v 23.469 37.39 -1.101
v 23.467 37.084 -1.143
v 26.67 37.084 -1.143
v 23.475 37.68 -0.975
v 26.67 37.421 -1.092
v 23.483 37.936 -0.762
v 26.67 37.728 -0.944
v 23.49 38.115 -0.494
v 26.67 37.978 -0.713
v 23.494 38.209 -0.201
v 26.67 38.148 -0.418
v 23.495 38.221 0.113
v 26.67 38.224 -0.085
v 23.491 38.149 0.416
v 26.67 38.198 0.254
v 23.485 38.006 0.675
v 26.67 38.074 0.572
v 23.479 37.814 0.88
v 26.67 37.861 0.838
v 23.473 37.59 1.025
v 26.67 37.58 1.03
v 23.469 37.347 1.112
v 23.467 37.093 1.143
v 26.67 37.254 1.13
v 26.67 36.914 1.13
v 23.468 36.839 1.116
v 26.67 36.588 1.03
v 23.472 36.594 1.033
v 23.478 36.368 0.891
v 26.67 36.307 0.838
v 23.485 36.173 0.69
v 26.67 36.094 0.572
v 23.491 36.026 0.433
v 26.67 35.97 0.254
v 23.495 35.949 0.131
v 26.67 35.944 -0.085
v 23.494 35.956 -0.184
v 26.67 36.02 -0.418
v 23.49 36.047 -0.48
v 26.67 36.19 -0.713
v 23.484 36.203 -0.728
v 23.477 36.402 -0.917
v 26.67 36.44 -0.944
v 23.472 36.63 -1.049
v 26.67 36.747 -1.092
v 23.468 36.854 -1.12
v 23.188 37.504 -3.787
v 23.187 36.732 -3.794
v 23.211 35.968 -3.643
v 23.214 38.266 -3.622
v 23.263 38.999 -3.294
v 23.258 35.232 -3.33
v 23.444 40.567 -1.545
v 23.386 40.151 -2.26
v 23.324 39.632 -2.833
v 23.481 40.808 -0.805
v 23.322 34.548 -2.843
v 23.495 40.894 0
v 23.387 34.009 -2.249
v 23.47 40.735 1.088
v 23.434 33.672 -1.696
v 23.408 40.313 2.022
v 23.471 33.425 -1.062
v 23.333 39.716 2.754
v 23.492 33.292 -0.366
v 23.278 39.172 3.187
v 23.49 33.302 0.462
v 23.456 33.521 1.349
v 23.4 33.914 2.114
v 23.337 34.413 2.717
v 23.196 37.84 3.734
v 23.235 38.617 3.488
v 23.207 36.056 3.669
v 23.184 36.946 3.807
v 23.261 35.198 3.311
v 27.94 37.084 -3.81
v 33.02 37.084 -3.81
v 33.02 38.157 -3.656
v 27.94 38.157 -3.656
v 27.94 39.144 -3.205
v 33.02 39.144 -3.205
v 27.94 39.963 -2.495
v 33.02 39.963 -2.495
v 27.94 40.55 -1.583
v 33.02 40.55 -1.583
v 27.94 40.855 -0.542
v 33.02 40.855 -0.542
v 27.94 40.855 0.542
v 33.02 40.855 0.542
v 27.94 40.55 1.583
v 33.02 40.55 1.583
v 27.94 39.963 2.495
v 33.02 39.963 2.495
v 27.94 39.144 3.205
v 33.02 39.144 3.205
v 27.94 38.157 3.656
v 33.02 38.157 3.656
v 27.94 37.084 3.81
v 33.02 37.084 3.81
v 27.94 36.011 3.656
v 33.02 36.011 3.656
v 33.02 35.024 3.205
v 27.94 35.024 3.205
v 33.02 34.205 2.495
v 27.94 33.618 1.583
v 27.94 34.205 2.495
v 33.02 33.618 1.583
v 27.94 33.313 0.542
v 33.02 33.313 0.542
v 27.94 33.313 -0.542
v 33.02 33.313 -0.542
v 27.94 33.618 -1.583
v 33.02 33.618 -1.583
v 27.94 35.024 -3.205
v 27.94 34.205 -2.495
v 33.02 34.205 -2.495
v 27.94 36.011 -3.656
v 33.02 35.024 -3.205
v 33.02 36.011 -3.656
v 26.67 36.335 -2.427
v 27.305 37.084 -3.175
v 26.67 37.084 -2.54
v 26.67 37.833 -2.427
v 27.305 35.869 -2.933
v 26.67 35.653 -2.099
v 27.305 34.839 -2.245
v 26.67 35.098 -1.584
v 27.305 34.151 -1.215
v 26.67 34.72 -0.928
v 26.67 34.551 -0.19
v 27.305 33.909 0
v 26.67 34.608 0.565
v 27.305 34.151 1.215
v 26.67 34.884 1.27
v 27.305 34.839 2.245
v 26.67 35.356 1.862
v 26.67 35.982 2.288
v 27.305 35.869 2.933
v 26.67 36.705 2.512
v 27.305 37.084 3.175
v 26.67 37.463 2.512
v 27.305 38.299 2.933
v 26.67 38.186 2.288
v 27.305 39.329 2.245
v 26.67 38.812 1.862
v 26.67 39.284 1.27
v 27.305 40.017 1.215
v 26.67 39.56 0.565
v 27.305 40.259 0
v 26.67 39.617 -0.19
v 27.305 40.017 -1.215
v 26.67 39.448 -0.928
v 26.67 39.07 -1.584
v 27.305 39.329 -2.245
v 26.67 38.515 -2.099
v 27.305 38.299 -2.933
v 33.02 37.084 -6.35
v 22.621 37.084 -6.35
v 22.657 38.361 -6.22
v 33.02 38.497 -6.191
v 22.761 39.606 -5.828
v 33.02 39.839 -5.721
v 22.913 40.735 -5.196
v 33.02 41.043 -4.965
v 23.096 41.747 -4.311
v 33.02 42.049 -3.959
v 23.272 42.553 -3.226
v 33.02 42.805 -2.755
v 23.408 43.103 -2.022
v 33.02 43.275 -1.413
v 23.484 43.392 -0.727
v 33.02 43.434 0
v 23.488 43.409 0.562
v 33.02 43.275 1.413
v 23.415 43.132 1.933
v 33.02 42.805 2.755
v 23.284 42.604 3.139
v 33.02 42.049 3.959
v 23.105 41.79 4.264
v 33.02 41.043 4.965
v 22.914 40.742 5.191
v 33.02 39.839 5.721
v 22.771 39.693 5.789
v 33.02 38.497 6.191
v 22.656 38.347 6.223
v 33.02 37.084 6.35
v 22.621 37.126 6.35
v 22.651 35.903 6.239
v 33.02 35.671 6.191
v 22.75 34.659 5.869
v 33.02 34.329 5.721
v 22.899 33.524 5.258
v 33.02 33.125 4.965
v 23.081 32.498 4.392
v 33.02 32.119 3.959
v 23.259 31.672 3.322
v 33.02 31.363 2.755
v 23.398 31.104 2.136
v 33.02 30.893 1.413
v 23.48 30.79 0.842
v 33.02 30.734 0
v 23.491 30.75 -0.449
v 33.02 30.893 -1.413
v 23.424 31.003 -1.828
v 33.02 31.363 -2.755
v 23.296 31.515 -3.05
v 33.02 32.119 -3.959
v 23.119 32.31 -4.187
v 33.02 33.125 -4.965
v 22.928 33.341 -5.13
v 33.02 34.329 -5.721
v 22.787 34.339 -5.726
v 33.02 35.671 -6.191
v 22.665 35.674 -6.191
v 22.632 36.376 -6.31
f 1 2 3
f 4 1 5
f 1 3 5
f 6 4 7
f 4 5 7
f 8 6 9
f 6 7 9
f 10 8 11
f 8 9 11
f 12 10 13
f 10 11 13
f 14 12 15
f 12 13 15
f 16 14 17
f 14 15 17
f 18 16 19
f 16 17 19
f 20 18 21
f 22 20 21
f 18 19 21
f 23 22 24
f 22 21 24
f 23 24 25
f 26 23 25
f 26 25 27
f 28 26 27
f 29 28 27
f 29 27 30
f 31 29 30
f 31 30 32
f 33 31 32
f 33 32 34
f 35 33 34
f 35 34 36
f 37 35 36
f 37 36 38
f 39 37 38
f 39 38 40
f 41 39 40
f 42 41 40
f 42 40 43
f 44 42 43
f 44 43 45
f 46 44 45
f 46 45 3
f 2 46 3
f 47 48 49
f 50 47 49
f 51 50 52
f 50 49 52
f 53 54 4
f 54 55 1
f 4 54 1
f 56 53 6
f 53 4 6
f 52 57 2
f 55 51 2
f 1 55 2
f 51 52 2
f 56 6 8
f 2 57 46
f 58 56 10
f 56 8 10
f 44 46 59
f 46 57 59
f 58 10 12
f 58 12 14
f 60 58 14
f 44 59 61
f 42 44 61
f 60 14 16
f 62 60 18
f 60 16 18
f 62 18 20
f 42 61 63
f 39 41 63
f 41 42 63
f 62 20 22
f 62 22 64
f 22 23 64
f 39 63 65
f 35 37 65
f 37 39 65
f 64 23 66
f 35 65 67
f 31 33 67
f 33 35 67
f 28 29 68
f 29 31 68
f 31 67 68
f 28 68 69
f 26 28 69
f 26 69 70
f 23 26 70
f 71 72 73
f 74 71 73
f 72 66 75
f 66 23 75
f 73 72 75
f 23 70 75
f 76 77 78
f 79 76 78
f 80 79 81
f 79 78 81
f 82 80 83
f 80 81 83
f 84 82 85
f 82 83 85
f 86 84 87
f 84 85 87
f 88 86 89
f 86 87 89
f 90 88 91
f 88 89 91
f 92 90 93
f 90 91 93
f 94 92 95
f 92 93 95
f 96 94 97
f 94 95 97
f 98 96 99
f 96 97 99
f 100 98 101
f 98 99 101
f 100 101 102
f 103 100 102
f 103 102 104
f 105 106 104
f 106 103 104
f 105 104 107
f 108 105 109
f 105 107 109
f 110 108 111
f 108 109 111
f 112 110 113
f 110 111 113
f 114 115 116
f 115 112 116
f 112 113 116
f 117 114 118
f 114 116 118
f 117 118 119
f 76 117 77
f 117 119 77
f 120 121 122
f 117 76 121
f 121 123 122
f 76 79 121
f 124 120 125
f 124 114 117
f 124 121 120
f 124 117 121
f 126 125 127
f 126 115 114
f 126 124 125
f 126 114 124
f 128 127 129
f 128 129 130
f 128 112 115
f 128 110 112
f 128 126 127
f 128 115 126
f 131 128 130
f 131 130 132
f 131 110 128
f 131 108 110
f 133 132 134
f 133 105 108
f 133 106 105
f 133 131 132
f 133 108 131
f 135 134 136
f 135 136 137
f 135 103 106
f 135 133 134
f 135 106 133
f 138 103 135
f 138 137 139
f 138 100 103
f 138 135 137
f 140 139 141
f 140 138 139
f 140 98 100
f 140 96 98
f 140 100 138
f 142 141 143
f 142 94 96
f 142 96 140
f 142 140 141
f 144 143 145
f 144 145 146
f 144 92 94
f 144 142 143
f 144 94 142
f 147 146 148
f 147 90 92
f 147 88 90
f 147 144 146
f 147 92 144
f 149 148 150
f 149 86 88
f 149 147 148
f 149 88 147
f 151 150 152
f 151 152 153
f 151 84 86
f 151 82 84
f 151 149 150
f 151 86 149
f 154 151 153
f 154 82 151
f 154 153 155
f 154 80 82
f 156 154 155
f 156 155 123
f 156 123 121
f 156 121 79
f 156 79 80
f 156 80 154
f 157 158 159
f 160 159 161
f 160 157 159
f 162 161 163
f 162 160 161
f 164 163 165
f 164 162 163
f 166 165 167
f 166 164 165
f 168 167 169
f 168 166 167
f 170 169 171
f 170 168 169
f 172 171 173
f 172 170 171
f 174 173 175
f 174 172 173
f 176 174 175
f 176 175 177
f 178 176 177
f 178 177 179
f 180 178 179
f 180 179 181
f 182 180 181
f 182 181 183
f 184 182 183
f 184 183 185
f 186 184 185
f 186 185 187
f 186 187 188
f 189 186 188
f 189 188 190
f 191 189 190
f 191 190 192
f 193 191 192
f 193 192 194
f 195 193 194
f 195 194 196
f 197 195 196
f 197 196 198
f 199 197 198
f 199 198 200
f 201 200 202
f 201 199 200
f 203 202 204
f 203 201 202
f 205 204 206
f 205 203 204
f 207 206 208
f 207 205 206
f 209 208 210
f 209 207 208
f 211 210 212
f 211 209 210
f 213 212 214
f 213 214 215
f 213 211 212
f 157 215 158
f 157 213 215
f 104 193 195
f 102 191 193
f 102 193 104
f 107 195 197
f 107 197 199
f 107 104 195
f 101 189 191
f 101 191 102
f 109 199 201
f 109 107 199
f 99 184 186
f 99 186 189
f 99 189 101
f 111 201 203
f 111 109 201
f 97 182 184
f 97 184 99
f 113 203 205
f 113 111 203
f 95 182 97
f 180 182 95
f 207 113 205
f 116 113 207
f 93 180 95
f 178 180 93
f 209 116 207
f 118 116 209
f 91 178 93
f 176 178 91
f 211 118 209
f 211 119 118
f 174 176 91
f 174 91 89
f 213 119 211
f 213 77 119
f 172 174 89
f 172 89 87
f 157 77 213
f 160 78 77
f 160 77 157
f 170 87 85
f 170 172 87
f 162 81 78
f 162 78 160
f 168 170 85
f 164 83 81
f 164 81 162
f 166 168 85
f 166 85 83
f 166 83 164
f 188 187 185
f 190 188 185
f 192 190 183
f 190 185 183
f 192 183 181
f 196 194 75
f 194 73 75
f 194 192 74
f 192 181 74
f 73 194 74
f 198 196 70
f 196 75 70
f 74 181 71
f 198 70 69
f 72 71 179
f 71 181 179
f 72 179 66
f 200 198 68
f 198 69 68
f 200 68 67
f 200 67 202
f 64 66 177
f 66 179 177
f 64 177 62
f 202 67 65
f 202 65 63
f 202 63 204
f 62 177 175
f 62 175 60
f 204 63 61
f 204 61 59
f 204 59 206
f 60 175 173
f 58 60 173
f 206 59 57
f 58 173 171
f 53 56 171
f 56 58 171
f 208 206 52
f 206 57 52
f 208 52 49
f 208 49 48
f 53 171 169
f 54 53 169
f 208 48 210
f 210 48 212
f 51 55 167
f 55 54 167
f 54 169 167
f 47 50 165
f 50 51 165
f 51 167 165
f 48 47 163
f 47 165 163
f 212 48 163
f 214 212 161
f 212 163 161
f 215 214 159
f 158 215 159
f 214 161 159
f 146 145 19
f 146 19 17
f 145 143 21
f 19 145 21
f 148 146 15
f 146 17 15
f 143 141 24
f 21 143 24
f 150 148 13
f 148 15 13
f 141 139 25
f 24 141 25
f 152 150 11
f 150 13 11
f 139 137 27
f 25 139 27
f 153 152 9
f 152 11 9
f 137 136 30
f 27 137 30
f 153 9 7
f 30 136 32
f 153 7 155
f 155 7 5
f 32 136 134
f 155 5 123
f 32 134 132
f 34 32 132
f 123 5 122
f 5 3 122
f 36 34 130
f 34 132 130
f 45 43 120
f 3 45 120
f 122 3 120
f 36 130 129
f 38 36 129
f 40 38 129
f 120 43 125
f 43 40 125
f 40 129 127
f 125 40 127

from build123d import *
from build123d.topology import SkipClean

# Parameters (mm, degrees)
SKETCH2_R                            = 23.495
INITIAL_DISK_DEPTH                   = 7.62
HOLLOW_START                         = 54.61
HOLLOW_CYLINDER_DEPTH                = 54.61
SKETCH5_R                            = 1.524
Y_SERVO_HOLE_1_DEPTH                 = 9.398
SKETCH8_R                            = 3.175
Y_SERVO_HOLE_3_DEPTH                 = 5.715
BOSS_EXTRUDE2_REACH                  = 65.924
BOSS_EXTRUDE2_DIRECTION_2_REACH      = 65.924
CUT_EXTRUDE3_DEPTH                   = 64.924034212
SKETCH9_W                            = 2.54
SKETCH9_H                            = 30.48
X_SERVO_TOP_MOUNT_DEPTH              = 6.35
FILLET3_START                        = -22
FILLET3_DEPTH                        = 45.495
SKETCH11_R                           = 2.286
X_SERVO_TOP_HOLES_DEPTH              = 2.54
X_START                              = 6.858
X_SERVO_BOTTOM_MOUNT_DEPTH           = 6.858
SKETCH14_R                           = 2.3495
X_SERVO_BOTTOM_HOLES_DEPTH           = 6.35
SKETCH15_R                           = 4.445
X_SERVO_BOTTOM_SCREW_CLEARANCE_DEPTH = 16.51
SKETCH18_W                           = 5.08
SKETCH18_H                           = 22.86
CUT_EXTRUDE2_DEPTH                   = 2.54
FILLET1_R                            = 1.27
BOSS_EXTRUDE1_DEPTH                  = 1.905
BOSS_EXTRUDE3_REACH                  = 70.14
SKETCH23_W                           = 1.905
SKETCH23_H                           = 0.757768233
BOSS_EXTRUDE4_DEPTH                  = 2.54
SKETCH24_R                           = 0.6096
CUT_EXTRUDE4_DEPTH                   = 10.16
BOSS_EXTRUDE5_REACH                  = 84.026
BOSS_EXTRUDE5_END_RADIUS             = 23.495
SKETCH16_R                           = 6.35
SKETCH16_R_2                         = 3.81
SKETCH26_R                           = 23.495
CUT_EXTRUDE5_DEPTH                   = 76.2
BOSS_EXTRUDE6_START                  = 33.2739999
BOSS_EXTRUDE6_DEPTH                  = 7.6200001
SKETCH29_R                           = 1.143
CUT_EXTRUDE6_DEPTH                   = 5.08
CHAMFER1_SIZE                        = 1.27


with BuildPart() as part:
    # Sketch2 → Initial Disk (new body)
    with BuildSketch(Plane(origin=(0, 0, 0), x_dir=(1, 0, 0), z_dir=(0, 1, 0))):
        with Locations(Location((0, 0, 0), (0, 0, 270))):
            Circle(SKETCH2_R)
    extrude(amount=-INITIAL_DISK_DEPTH)

    # Sketch3 → Hollow Cylinder (add)
    with SkipClean():  # the faces are left unmerged after this step: merging them gives an invalid solid
        with BuildSketch(Plane(origin=(0, 0, 0), x_dir=(1, 0, 0), z_dir=(0, 1, 0)).offset(HOLLOW_START)):
            with BuildLine():
                Line((-17.770847855, 11.104458182), (-20.705217543, 11.104458182))
                ThreePointArc((-20.705217543, 11.104458182), (23.495, 0), (-20.705217543, -11.104458182))
                Line((-20.705217543, -11.104458182), (-17.770847855, -11.104458182))
                ThreePointArc((-17.770847855, -11.104458182), (20.955, 0), (-17.770847855, 11.104458182))
            make_face()
        extrude(amount=-HOLLOW_CYLINDER_DEPTH)

    # Sketch5 → Y Servo Hole 1 (cut)
    with SkipClean():  # the faces are left unmerged after this step: merging them gives an invalid solid
        with BuildSketch(Plane.XZ.offset(7.62)):
            with Locations(Location((0, 0, 0), (0, 0, 270))):
                Circle(SKETCH5_R)
        extrude(amount=-Y_SERVO_HOLE_1_DEPTH, mode=Mode.SUBTRACT)

    # Sketch8 → Y Servo Hole 3 (cut)
    with SkipClean():  # the faces are left unmerged after this step: merging them gives an invalid solid
        with BuildSketch(Plane(origin=(0, 0, 0), x_dir=(1, 0, 0), z_dir=(0, 1, 0))):
            with Locations(Location((0, 0, 0), (0, 0, 270))):
                Circle(SKETCH8_R)
        extrude(amount=-Y_SERVO_HOLE_3_DEPTH, mode=Mode.SUBTRACT)

    # Sketch20 → Boss-Extrude2 (add, up to next)
    with BuildSketch(Plane(origin=(0, 0, 0), x_dir=(0, 0, -1), z_dir=(1, 0, 0)), mode=Mode.PRIVATE) as boss_extrude2_sk1:
        Polygon((23.495, 41.342827261), (14.205225637, 54.61), (11.104458182, 54.61), (21.414353808, 39.885943113), align=None)
    boss_extrude2_tool1 = extrude(boss_extrude2_sk1.sketch, amount=BOSS_EXTRUDE2_REACH, mode=Mode.PRIVATE) - part.part
    boss_extrude2 = boss_extrude2_tool1.solids().sort_by_distance((0, 47.605874, -17.532286))[0]
    add(boss_extrude2)

    # Sketch20 → Boss-Extrude2 direction 2 (add, up to next)
    with BuildSketch(Plane(origin=(0, 0, 0), x_dir=(0, 0, -1), z_dir=(1, 0, 0)), mode=Mode.PRIVATE) as boss_extrude2_direction_2_sk1:
        Polygon((23.495, 41.342827261), (14.205225637, 54.61), (11.104458182, 54.61), (21.414353808, 39.885943113), align=None)
    boss_extrude2_direction_2_tool1 = extrude(boss_extrude2_direction_2_sk1.sketch, amount=-BOSS_EXTRUDE2_DIRECTION_2_REACH, mode=Mode.PRIVATE) - part.part
    boss_extrude2_direction_2 = boss_extrude2_direction_2_tool1.solids().sort_by_distance((0, 47.605874, -17.532286))[0]
    add(boss_extrude2_direction_2)

    # Sketch21 → Cut-Extrude3 (cut, symmetric)
    with SkipClean():  # the faces are left unmerged after this step: merging them gives an invalid solid
        with BuildSketch(Plane(origin=(0, 0, 0), x_dir=(0, 0, -1), z_dir=(1, 0, 0))):
            Polygon((23.495, 54.61), (14.205225637, 54.61), (23.495, 41.342827261), align=None)
        cut_extrude3 = extrude(amount=CUT_EXTRUDE3_DEPTH, both=True, mode=Mode.SUBTRACT)

    # Mirror2: Boss-Extrude2, Boss-Extrude2 direction 2, Cut-Extrude3 across plane
    with SkipClean():  # the faces are left unmerged after this step: merging them gives an invalid solid
        add(boss_extrude2.mirror(Plane.XY))
        add(boss_extrude2_direction_2.mirror(Plane.XY))
        add(cut_extrude3.mirror(Plane.XY), mode=Mode.SUBTRACT)

    # Sketch9 → X Servo Top Mount (add)
    with SkipClean():  # the faces are left unmerged after this step: merging them gives an invalid solid
        with BuildSketch(Plane(origin=(0, 54.61, 0), x_dir=(1, 0, 0), z_dir=(0, 1, 0))):
            with Locations((-8.5344, 0)):
                Rectangle(SKETCH9_W, SKETCH9_H)
        extrude(amount=-X_SERVO_TOP_MOUNT_DEPTH)

    # Fillet3: read off the stored shape, not the designer's step
    # Fillet3 outline → Fillet3 (cut)
    with SkipClean():  # the faces are left unmerged after this step: merging them gives an invalid solid
        with BuildSketch(Plane.YZ.offset(FILLET3_START)):
            with BuildLine():
                Line((53.132189057, 15.24), (50.819094519, 16.859646232))
                ThreePointArc((50.819094519, 16.859646232), (53.605526779, 13.682328823), (54.61, 9.577382514))
                Line((54.61, 9.577382514), (54.61, 15.24))
                Line((54.61, 15.24), (53.132189057, 15.24))
            make_face()
            with BuildLine():
                ThreePointArc((54.61, -9.577384558), (53.605525966, -13.682330385), (50.81909331, -16.859647079))
                Line((50.81909331, -16.859647079), (53.132189057, -15.24))
                Line((53.132189057, -15.24), (54.61, -15.24))
                Line((54.61, -15.24), (54.61, -9.577384558))
            make_face()
        extrude(amount=FILLET3_DEPTH, mode=Mode.SUBTRACT)

    # Sketch11 → X Servo Top Holes (cut)
    with SkipClean():  # the faces are left unmerged after this step: merging them gives an invalid solid
        with BuildSketch(Plane.ZY.offset(9.8044)):
            with Locations((-4.953, 51.689)):
                Circle(SKETCH11_R)
            with Locations(Location((4.953, 51.689, 0), (0, 0, 180))):
                Circle(SKETCH11_R)
        extrude(amount=-X_SERVO_TOP_HOLES_DEPTH, mode=Mode.SUBTRACT)

    # Sketch13 → X Servo Bottom Mount (add)
    with SkipClean():  # the faces are left unmerged after this step: merging them gives an invalid solid
        with BuildSketch(Plane(origin=(0, 0, 0), x_dir=(1, 0, 0), z_dir=(0, 1, 0)).offset(X_START)):
            with BuildLine():
                Line((-9.8044, 18.519874882), (-9.8044, -18.519874882))
                ThreePointArc((-9.8044, -18.519874882), (-8.553269609, -19.129913852), (-7.2644, -19.65554674))
                Line((-7.2644, -19.65554674), (-7.2644, 19.65554674))
                ThreePointArc((-7.2644, 19.65554674), (-8.553269609, 19.129913852), (-9.8044, 18.519874882))
            make_face()
        extrude(amount=-X_SERVO_BOTTOM_MOUNT_DEPTH)

    # Sketch14 → X Servo Bottom Holes (cut)
    with SkipClean():  # the faces are left unmerged after this step: merging them gives an invalid solid
        with BuildSketch(Plane.ZY.offset(9.8044)):
            with Locations(Location((-4.953, 2.286, 0), (0, 0, 283.351184332))):
                Circle(SKETCH14_R)
            with Locations(Location((4.953, 2.286, 0), (0, 0, 283.351184332))):
                Circle(SKETCH14_R)
        extrude(amount=-X_SERVO_BOTTOM_HOLES_DEPTH, mode=Mode.SUBTRACT)

    # Sketch15 → X Servo Bottom Screw Clearance (cut)
    with SkipClean():  # the faces are left unmerged after this step: merging them gives an invalid solid
        with BuildSketch(Plane.ZY.offset(9.8044)):
            with Locations((-4.9784, 2.98958)):
                Circle(SKETCH15_R)
            with Locations((4.9784, 2.98958)):
                Circle(SKETCH15_R)
        extrude(amount=X_SERVO_BOTTOM_SCREW_CLEARANCE_DEPTH, mode=Mode.SUBTRACT)

    # Sketch18 → Cut-Extrude2 (cut)
    with SkipClean():  # the faces are left unmerged after this step: merging them gives an invalid solid
        with BuildSketch(Plane(origin=(0, 0, 0), x_dir=(1, 0, 0), z_dir=(0, 1, 0))):
            with Locations((-4.7244, 0)):
                Rectangle(SKETCH18_W, SKETCH18_H)
        extrude(amount=-CUT_EXTRUDE2_DEPTH, mode=Mode.SUBTRACT)

    # Fillet1
    fillet1_edges = [part.edges().sort_by_distance(p)[0] for p in [
        (-2.1844, -1.27, 2.304131429),
        (-2.1844, -1.27, -2.304131429),
    ]]
    fillet(fillet1_edges, radius=FILLET1_R)

    # Sketch19 → Boss-Extrude1 (add)
    with SkipClean():  # the faces are left unmerged after this step: merging them gives an invalid solid
        with BuildSketch(Plane(origin=(-7.2644, 0, 0), x_dir=(0, 0, -1), z_dir=(1, 0, 0))):
            Polygon((-8.032586336, 6.858), (-10.672231767, 2.286), (-10.672231767, -2.54), (-8.139638623, -2.54), (-1.766361377, -2.54), (0, -2.54), (0, 1.00284174), (0, 3.61315235), (-1.873413664, 6.858), align=None)
            Polygon((-2.973265927, 5.715), (-6.932734073, 5.715), (-8.912468146, 2.286), (-6.932734073, -1.143), (-2.973265927, -1.143), (-0.993531854, 2.286), align=None, mode=Mode.SUBTRACT)
        boss_extrude1 = extrude(amount=BOSS_EXTRUDE1_DEPTH)

    # Mirror1: Boss-Extrude1 across plane
    with SkipClean():  # the faces are left unmerged after this step: merging them gives an invalid solid
        add(boss_extrude1.mirror(Plane.XY))

    # Sketch22 → Boss-Extrude3 (add, up to next)
    with BuildSketch(Plane.ZY.offset(9.8044), mode=Mode.PRIVATE) as boss_extrude3_sk1:
        with BuildLine():
            ThreePointArc((11.210377262, 54.458731878), (11.157446673, 54.468457219), (11.104458182, 54.477861962))
            Line((11.104458182, 54.477861962), (11.104458182, 48.26))
            Line((11.104458182, 48.26), (15.24, 48.26))
            Line((15.24, 48.26), (15.24, 48.703834196))
            Line((15.24, 48.703834196), (11.210377262, 54.458731878))
        make_face()
    boss_extrude3_tool1 = extrude(boss_extrude3_sk1.sketch, amount=BOSS_EXTRUDE3_REACH, mode=Mode.PRIVATE) - part.part
    # Sketch22 → Boss-Extrude3 (add, up to next)
    with BuildSketch(Plane.ZY.offset(9.8044), mode=Mode.PRIVATE) as boss_extrude3_sk2:
        with BuildLine():
            Line((-15.24, 48.26), (-11.104458182, 48.26))
            Line((-11.104458182, 48.26), (-11.104458182, 54.477861962))
            ThreePointArc((-11.104458182, 54.477861962), (-11.157446673, 54.468457219), (-11.210377262, 54.458731878))
            Line((-11.210377262, 54.458731878), (-15.24, 48.703834196))
            Line((-15.24, 48.703834196), (-15.24, 48.26))
        make_face()
    boss_extrude3_tool2 = extrude(boss_extrude3_sk2.sketch, amount=BOSS_EXTRUDE3_REACH, mode=Mode.PRIVATE) - part.part
    add(boss_extrude3_tool1.solids().sort_by_distance((-9.8044, 50.384277, 12.573742))[0])
    add(boss_extrude3_tool2.solids().sort_by_distance((-9.8044, 50.384277, -12.573742))[0])

    # Sketch23 → Boss-Extrude4 (add)
    with SkipClean():  # the faces are left unmerged after this step: merging them gives an invalid solid
        with BuildSketch(Plane(origin=(0, -2.54, 0), x_dir=(1, 0, 0), z_dir=(0, 1, 0))):
            with Locations((-6.3119, 11.051115884)):
                Rectangle(SKETCH23_W, SKETCH23_H)
            with Locations((-6.3119, -11.051115884)):
                Rectangle(SKETCH23_W, SKETCH23_H)
        extrude(amount=BOSS_EXTRUDE4_DEPTH)

    # Sketch24 → Cut-Extrude4 (cut)
    with SkipClean():  # the faces are left unmerged after this step: merging them gives an invalid solid
        with BuildSketch(Plane.XZ.offset(7.62)):
            with Locations(Location((0, 6.9977, 0), (0, 0, 270))):
                Circle(SKETCH24_R)
            with Locations(Location((6.9977, 0, 0), (0, 0, 270))):
                Circle(SKETCH24_R)
            with Locations(Location((0, -6.9977, 0), (0, 0, 270))):
                Circle(SKETCH24_R)
        extrude(amount=-CUT_EXTRUDE4_DEPTH, mode=Mode.SUBTRACT)

    # Boss-Extrude5: up to this cylinder (the profile starts outside it)
    with SkipClean():  # the faces are left unmerged after this step: merging them gives an invalid solid
        boss_extrude5_end = Plane(origin=(0, 37.084, 0), z_dir=(0, 1, 0)) * Cylinder(BOSS_EXTRUDE5_END_RADIUS, 216.042, mode=Mode.PRIVATE)
        # Sketch16 → Boss-Extrude5 (add, up to the surface)
        with BuildSketch(Plane(origin=(33.02, 0, 0), x_dir=(0, 0, -1), z_dir=(1, 0, 0)), mode=Mode.PRIVATE) as boss_extrude5_sk1:
            with Locations((0, 37.084)):
                Circle(SKETCH16_R)
            with Locations((0, 37.084)):
                Circle(SKETCH16_R_2, mode=Mode.SUBTRACT)
        boss_extrude5_tool1 = extrude(boss_extrude5_sk1.sketch, amount=-BOSS_EXTRUDE5_REACH, mode=Mode.PRIVATE) - boss_extrude5_end
        add(boss_extrude5_tool1.solids().sort_by_distance((33.02, 37.084, 6.170395))[0])

    # Sketch26 → Cut-Extrude5 (cut)
    with BuildSketch(Plane(origin=(0, 54.61, 0), x_dir=(1, 0, 0), z_dir=(0, 1, 0))):
        Circle(SKETCH26_R)
    extrude(amount=-CUT_EXTRUDE5_DEPTH, mode=Mode.SUBTRACT)

    # Boss-Extrude6: read off the stored shape, not the designer's step
    # Boss-Extrude6 outline → Boss-Extrude6 (add)
    with BuildSketch(Plane(origin=(0, 0, 0), x_dir=(1, 0, 0), z_dir=(0, 1, 0)).offset(BOSS_EXTRUDE6_START)):
        with BuildLine():
            ThreePointArc((22.956807814, 5), (23.495, 0), (22.956807814, -5))
            Line((22.956807814, -5), (26.67, -5))
            Line((26.67, -5), (26.67, 5))
            Line((26.67, 5), (22.956807814, 5))
        make_face()
    extrude(amount=BOSS_EXTRUDE6_DEPTH)

    # Sketch29 → Cut-Extrude6 (cut)
    with BuildSketch(Plane(origin=(26.67, 0, 0), x_dir=(0, 0, -1), z_dir=(1, 0, 0))):
        with Locations((0, 37.084)):
            Circle(SKETCH29_R)
    extrude(amount=-CUT_EXTRUDE6_DEPTH, mode=Mode.SUBTRACT)

    # Chamfer1
    chamfer1_edges = [part.edges().sort_by_distance(p)[0] for p in [
        (26.67, 37.084, 3.81),
    ]]
    chamfer(chamfer1_edges, length=CHAMFER1_SIZE)


solid = part.part
